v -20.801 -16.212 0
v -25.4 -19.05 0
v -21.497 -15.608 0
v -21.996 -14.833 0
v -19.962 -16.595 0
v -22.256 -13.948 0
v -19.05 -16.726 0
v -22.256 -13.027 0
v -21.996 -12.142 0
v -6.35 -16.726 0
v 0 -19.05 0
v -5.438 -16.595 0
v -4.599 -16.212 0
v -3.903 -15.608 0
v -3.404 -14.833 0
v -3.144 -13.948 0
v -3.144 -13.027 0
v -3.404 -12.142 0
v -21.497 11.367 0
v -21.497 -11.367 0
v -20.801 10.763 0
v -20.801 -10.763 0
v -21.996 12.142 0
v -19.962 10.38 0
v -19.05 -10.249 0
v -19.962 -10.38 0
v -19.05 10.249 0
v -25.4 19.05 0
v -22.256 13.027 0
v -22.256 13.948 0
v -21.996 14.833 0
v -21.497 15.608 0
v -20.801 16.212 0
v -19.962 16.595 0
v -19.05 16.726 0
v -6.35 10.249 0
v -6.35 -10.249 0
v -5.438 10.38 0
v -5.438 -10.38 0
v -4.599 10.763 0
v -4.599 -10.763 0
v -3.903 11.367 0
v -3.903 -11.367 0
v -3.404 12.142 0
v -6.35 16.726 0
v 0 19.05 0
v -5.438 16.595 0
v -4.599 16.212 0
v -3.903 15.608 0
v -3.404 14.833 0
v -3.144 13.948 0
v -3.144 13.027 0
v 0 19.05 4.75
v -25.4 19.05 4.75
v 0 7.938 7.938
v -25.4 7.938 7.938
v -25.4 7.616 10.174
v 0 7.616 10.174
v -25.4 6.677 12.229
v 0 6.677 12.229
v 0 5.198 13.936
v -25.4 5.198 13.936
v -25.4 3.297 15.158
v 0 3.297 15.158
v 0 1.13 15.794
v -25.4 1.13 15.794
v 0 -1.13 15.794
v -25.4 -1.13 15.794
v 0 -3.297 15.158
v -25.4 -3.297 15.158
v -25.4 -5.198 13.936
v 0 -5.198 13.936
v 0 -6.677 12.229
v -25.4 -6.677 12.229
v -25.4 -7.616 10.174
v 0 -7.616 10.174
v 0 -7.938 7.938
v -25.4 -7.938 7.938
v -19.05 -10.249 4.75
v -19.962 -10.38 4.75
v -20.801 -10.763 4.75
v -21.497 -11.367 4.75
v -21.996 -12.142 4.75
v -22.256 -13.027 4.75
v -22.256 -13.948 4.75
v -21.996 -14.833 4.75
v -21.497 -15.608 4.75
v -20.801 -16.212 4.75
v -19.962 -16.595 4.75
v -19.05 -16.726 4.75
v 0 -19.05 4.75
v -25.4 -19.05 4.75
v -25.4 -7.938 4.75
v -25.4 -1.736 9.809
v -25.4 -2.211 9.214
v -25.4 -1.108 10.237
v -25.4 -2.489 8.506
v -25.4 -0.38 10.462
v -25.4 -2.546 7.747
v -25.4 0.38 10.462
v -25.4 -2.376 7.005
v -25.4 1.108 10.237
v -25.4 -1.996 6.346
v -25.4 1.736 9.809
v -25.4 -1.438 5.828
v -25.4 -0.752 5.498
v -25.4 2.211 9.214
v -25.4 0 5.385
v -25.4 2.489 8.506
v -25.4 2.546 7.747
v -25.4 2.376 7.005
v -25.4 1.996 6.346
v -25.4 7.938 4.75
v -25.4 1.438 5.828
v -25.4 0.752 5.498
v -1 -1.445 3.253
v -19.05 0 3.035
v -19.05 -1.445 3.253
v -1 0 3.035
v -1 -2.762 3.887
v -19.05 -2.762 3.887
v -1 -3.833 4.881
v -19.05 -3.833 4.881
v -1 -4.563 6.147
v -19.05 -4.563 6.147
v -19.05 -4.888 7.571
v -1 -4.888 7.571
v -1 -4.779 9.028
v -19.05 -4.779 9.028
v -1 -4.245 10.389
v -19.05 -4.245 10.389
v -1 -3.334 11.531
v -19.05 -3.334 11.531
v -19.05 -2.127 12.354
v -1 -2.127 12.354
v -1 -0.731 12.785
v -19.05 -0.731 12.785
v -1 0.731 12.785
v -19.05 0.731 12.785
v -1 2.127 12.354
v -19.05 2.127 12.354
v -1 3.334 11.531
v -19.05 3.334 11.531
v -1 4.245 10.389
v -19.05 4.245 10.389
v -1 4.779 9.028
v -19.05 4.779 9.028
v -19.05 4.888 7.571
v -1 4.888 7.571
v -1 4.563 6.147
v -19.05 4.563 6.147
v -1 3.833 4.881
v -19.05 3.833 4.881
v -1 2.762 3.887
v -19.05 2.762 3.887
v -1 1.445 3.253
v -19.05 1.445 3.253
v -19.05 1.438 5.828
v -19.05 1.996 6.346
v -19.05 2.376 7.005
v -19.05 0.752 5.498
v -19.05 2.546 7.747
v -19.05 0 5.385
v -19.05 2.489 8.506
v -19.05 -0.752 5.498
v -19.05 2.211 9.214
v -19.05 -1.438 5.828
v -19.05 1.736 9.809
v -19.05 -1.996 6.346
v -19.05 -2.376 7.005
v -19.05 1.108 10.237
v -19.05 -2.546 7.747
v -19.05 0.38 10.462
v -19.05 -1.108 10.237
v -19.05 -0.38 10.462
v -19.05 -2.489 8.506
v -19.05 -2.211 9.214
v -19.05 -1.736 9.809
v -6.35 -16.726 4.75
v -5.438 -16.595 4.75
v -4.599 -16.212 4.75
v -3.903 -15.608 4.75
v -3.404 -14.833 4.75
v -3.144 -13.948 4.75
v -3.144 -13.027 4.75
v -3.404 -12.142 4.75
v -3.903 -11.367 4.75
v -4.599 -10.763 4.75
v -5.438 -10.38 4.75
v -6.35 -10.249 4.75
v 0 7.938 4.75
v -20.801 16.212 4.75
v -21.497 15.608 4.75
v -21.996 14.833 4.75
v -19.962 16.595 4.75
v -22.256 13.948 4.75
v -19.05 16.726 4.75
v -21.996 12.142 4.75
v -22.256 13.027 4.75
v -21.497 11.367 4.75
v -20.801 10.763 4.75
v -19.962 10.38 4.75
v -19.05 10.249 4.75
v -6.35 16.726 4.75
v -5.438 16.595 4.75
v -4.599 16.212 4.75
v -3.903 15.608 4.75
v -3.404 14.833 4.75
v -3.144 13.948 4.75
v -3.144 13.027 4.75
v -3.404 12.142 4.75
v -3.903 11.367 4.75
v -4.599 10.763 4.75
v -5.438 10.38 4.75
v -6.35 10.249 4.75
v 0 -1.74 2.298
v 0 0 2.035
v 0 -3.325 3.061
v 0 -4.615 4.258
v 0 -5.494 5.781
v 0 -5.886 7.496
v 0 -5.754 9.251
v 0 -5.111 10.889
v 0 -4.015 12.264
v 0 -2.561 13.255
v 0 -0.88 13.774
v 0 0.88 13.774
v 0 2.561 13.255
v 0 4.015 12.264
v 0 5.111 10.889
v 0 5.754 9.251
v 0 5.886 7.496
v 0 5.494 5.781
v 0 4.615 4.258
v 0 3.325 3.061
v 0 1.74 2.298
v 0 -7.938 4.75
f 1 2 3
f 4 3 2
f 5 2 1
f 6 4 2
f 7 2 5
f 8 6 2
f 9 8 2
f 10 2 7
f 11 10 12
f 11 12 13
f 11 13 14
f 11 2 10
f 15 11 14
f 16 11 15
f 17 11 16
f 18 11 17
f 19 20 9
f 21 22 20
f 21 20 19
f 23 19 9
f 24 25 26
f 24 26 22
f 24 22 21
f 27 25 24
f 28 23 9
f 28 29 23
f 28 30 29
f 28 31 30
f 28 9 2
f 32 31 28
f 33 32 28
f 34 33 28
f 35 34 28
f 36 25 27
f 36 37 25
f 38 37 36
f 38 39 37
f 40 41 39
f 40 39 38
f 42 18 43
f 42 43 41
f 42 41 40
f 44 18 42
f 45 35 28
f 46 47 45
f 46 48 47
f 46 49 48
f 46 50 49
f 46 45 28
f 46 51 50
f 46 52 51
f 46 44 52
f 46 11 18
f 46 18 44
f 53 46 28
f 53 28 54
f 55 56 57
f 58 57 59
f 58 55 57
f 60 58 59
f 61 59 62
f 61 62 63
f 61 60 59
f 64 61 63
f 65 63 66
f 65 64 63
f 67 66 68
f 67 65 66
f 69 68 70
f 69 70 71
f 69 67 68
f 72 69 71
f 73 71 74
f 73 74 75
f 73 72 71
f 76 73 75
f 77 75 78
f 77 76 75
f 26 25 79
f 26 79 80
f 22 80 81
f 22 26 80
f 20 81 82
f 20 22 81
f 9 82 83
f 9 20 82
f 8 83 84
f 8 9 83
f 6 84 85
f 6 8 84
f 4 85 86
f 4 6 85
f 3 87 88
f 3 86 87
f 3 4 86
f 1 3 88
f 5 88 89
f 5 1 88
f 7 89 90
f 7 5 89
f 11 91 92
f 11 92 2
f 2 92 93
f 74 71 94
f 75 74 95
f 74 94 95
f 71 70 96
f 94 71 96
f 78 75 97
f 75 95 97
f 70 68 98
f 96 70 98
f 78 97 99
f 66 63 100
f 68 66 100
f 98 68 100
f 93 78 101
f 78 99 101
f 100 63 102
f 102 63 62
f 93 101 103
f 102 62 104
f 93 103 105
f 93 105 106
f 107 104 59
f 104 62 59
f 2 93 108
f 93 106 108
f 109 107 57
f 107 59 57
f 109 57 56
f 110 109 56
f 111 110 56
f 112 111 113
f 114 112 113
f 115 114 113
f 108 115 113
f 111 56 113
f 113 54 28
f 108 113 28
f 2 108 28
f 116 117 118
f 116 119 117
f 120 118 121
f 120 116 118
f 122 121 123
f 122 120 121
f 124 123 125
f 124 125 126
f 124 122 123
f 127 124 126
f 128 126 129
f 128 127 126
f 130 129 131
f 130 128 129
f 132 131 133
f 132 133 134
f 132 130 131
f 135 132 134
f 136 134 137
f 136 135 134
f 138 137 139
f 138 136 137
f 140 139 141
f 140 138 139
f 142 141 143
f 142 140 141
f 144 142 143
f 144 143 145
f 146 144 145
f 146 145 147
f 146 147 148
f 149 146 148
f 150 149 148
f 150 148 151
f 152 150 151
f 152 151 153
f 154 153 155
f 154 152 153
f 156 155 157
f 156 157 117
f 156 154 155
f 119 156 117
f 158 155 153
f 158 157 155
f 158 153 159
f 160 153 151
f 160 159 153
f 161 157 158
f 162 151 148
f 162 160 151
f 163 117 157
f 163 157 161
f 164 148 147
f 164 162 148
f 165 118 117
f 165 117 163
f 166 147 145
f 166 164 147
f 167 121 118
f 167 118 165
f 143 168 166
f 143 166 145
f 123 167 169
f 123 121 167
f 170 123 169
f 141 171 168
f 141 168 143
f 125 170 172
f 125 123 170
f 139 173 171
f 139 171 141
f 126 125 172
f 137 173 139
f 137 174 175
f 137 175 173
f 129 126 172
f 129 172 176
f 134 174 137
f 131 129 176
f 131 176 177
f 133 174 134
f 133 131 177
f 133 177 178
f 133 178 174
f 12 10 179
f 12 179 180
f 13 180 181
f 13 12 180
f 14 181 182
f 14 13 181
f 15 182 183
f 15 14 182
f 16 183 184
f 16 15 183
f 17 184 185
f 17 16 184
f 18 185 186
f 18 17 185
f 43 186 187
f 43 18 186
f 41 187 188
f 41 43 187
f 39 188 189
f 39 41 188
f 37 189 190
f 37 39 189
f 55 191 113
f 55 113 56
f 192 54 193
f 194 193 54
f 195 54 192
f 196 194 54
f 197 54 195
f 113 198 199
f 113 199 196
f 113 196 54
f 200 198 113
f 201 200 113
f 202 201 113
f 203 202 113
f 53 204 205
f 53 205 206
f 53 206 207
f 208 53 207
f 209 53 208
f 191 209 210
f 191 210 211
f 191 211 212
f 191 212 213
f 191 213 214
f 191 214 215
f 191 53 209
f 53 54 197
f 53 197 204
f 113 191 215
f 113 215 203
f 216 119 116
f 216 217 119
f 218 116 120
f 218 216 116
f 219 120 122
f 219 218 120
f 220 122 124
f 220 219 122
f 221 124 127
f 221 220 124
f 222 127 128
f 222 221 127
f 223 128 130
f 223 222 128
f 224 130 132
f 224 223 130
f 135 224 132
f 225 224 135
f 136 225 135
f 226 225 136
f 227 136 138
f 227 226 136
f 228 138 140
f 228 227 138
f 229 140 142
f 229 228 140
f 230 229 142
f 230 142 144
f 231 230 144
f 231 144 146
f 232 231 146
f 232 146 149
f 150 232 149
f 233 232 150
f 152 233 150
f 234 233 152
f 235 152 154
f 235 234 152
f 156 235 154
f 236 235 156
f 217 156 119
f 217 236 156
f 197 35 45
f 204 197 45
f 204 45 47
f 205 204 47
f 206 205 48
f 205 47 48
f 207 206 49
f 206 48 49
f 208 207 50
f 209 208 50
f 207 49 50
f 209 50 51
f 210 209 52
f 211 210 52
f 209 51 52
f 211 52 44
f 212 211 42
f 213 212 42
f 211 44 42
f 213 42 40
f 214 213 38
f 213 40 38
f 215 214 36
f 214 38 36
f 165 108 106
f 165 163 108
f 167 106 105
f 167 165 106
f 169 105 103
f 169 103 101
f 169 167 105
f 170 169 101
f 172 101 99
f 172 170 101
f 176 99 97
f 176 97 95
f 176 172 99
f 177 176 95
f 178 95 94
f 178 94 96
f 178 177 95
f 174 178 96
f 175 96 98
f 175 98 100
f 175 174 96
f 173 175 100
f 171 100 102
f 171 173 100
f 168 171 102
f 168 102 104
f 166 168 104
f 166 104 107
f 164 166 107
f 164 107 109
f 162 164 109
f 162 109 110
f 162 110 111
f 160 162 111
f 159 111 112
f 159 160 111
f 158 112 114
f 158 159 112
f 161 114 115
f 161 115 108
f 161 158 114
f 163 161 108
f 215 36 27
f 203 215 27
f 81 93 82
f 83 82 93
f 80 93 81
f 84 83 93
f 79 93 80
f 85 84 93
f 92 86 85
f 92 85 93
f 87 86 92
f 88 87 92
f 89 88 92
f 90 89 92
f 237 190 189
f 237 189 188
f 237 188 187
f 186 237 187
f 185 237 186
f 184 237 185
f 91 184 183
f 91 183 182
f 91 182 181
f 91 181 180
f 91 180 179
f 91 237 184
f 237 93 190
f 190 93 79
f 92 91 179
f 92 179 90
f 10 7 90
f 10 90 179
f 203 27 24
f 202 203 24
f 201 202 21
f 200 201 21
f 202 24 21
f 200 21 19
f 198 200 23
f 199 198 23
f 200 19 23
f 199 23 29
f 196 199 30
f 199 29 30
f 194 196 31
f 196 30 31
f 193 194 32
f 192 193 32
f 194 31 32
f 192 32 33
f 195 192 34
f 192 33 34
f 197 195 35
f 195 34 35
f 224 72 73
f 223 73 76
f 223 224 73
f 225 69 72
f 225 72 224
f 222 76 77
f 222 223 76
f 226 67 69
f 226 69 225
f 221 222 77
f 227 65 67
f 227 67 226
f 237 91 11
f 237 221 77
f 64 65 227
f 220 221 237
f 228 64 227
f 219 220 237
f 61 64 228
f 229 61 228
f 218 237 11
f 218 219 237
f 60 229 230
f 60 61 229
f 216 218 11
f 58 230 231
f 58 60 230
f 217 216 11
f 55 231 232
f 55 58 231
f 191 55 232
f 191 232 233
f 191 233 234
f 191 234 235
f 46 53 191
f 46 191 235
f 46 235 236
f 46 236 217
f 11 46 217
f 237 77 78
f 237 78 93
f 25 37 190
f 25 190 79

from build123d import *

# Parameters (mm, degrees)
BOSS_EXTRUDE1_DEPTH = 25.4
CUT_EXTRUDE2_REACH  = 37.498


with BuildPart() as part:
    # Sketch1 → Boss-Extrude1 (new body)
    with BuildSketch(Plane(origin=(0, 0, 0), x_dir=(0, 0, -1), z_dir=(1, 0, 0))):
        with BuildLine():
            Line((0, -19.05), (0, 19.05))
            Line((0, 19.05), (-4.7498, 19.05))
            Line((-4.7498, 19.05), (-4.7498, 7.9375))
            Line((-4.7498, 7.9375), (-7.9375, 7.9375))
            ThreePointArc((-7.9375, 7.9375), (-15.875, 0), (-7.9375, -7.9375))
            Line((-7.9375, -7.9375), (-4.7498, -7.9375))
            Line((-4.7498, -7.9375), (-4.7498, -19.05))
            Line((-4.7498, -19.05), (0, -19.05))
        make_face()
    extrude(amount=-BOSS_EXTRUDE1_DEPTH)

    # Sketch2 → Cut-Revolve1 (revolve, cut)
    with BuildSketch(Plane(origin=(0, 0, 0), x_dir=(1, 0, 0), z_dir=(0, 1, 0)), mode=Mode.PRIVATE) as cut_revolve1_sk:
        Polygon((-25.4, -7.9375), (-25.4, -10.4902), (-19.05, -10.4902), (-19.05, -12.8397), (-1, -12.8397), (0, -13.8397), (0, -7.9375), align=None)
    revolve(cut_revolve1_sk.sketch.rotate(Axis((0, 0, 7.9375), (-1, 0, 0)), 180), axis=Axis((0, 0, 7.9375), (-1, 0, 0)), mode=Mode.SUBTRACT)

    # Sketch3 → Cut-Extrude2 (cut, up to next)
    with BuildSketch(Plane.XY, mode=Mode.PRIVATE) as cut_extrude2_sk1:
        with BuildLine():
            Line((-19.05, 16.7259), (-6.35, 16.7259))
            ThreePointArc((-6.35, 16.7259), (-3.1115, 13.4874), (-6.35, 10.2489))
            Line((-6.35, 10.2489), (-19.05, 10.2489))
            ThreePointArc((-19.05, 10.2489), (-22.2885, 13.4874), (-19.05, 16.7259))
        make_face()
    cut_extrude2_tool1 = extrude(cut_extrude2_sk1.sketch, amount=CUT_EXTRUDE2_REACH, mode=Mode.PRIVATE) & part.part
    # Sketch3 → Cut-Extrude2 (cut, up to next)
    with BuildSketch(Plane.XY, mode=Mode.PRIVATE) as cut_extrude2_sk2:
        with BuildLine():
            Line((-19.05, -16.7259), (-6.35, -16.7259))
            ThreePointArc((-6.35, -16.7259), (-3.1115, -13.4874), (-6.35, -10.2489))
            Line((-6.35, -10.2489), (-19.05, -10.2489))
            ThreePointArc((-19.05, -10.2489), (-22.2885, -13.4874), (-19.05, -16.7259))
        make_face()
    cut_extrude2_tool2 = extrude(cut_extrude2_sk2.sketch, amount=CUT_EXTRUDE2_REACH, mode=Mode.PRIVATE) & part.part
    add(cut_extrude2_tool1.solids().sort_by_distance((-12.7, 13.4874, 0))[0], mode=Mode.SUBTRACT)
    add(cut_extrude2_tool2.solids().sort_by_distance((-12.7, -13.4874, 0))[0], mode=Mode.SUBTRACT)


solid = part.part
